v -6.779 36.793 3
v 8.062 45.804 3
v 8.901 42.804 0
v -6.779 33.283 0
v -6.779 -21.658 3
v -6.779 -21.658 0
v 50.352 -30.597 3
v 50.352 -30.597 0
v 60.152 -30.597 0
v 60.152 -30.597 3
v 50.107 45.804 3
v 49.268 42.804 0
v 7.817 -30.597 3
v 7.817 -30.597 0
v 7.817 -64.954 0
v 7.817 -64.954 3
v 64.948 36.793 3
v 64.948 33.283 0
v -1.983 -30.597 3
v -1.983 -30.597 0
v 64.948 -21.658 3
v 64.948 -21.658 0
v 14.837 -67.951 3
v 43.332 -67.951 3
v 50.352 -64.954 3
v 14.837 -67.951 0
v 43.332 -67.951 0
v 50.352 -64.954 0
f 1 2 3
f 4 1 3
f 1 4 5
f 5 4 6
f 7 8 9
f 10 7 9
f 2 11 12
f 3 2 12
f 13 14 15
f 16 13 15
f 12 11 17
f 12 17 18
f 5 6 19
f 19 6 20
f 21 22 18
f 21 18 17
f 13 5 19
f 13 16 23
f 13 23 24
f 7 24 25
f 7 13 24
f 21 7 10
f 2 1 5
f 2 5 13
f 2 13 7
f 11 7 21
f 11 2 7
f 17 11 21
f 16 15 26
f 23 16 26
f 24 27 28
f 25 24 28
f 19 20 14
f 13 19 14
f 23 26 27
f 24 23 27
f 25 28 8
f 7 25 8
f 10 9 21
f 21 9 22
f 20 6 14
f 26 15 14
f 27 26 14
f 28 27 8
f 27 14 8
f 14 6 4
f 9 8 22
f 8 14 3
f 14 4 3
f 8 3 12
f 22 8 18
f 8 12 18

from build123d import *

# Parameters (mm, degrees)
F1_DEPTH    = 3
F2_T1_DEPTH = 42.4243909264
F2_T3_DEPTH = 68.8811967359
F2_T5_DEPTH = 42.4243909264


# Not quite as in the source:
# - a fillet or chamfer that OpenCascade refuses, or shapes differently, is made with other operations: its cross-section is extruded or revolved along the edge and cut away or added


with BuildPart() as f1:
    # F0 (on Top) → F1 (new body)
    with BuildSketch(Plane.XY):
        Polygon((50.666670315, 47.8041956116), (7.5023034588, 47.8041956116), (-6.7788518712, 39.1329097454), (-6.7788518712, -21.6580425002), (-1.982757669, -30.5968765852), (7.8172552019, -30.5968765852), (7.8172552019, -64.9542560763), (14.8365469649, -67.9511922197), (43.3324268088, -67.9511922197), (50.3517185719, -64.9542560763), (50.3517185719, -30.5968765852), (60.1517314427, -30.5968765852), (64.9478256449, -21.6580425002), (64.9478256449, 39.1329097454), align=None)
    extrude(amount=F1_DEPTH)

    # F2: chamfer of 5 on 3 edges, made by hand

    # F2_s2 → F2_t1 (cut)
    with BuildSketch(Plane(origin=(41.0836527068, -24.9453275187, 0), x_dir=(0, 0, 1), z_dir=(-0.8547719975, 0.5190036919, 0))):
        Polygon((5, 67.1578767244), (0, 62.1578767244), (0, 67.1578767244), align=None)
    extrude(amount=F2_T1_DEPTH, mode=Mode.SUBTRACT)

    # F2_s4 → F2_t3 (cut)
    with BuildSketch(Plane.YZ.offset(-5.3561114811)):
        Polygon((47.8041956116, 5), (42.8041956116, 0), (47.8041956116, 0), align=None)
    extrude(amount=F2_T3_DEPTH, mode=Mode.SUBTRACT)

    # F2_s6 → F2_t5 (cut)
    with BuildSketch(Plane(origin=(37.6798265821, 22.8785795082, 0), x_dir=(0, 0, 1), z_dir=(-0.8547719975, -0.5190036919, 0))):
        Polygon((5, 36.9679645806), (0, 31.9679645806), (0, 36.9679645806), align=None)
    extrude(amount=F2_T5_DEPTH, mode=Mode.SUBTRACT)


solid = f1.part
